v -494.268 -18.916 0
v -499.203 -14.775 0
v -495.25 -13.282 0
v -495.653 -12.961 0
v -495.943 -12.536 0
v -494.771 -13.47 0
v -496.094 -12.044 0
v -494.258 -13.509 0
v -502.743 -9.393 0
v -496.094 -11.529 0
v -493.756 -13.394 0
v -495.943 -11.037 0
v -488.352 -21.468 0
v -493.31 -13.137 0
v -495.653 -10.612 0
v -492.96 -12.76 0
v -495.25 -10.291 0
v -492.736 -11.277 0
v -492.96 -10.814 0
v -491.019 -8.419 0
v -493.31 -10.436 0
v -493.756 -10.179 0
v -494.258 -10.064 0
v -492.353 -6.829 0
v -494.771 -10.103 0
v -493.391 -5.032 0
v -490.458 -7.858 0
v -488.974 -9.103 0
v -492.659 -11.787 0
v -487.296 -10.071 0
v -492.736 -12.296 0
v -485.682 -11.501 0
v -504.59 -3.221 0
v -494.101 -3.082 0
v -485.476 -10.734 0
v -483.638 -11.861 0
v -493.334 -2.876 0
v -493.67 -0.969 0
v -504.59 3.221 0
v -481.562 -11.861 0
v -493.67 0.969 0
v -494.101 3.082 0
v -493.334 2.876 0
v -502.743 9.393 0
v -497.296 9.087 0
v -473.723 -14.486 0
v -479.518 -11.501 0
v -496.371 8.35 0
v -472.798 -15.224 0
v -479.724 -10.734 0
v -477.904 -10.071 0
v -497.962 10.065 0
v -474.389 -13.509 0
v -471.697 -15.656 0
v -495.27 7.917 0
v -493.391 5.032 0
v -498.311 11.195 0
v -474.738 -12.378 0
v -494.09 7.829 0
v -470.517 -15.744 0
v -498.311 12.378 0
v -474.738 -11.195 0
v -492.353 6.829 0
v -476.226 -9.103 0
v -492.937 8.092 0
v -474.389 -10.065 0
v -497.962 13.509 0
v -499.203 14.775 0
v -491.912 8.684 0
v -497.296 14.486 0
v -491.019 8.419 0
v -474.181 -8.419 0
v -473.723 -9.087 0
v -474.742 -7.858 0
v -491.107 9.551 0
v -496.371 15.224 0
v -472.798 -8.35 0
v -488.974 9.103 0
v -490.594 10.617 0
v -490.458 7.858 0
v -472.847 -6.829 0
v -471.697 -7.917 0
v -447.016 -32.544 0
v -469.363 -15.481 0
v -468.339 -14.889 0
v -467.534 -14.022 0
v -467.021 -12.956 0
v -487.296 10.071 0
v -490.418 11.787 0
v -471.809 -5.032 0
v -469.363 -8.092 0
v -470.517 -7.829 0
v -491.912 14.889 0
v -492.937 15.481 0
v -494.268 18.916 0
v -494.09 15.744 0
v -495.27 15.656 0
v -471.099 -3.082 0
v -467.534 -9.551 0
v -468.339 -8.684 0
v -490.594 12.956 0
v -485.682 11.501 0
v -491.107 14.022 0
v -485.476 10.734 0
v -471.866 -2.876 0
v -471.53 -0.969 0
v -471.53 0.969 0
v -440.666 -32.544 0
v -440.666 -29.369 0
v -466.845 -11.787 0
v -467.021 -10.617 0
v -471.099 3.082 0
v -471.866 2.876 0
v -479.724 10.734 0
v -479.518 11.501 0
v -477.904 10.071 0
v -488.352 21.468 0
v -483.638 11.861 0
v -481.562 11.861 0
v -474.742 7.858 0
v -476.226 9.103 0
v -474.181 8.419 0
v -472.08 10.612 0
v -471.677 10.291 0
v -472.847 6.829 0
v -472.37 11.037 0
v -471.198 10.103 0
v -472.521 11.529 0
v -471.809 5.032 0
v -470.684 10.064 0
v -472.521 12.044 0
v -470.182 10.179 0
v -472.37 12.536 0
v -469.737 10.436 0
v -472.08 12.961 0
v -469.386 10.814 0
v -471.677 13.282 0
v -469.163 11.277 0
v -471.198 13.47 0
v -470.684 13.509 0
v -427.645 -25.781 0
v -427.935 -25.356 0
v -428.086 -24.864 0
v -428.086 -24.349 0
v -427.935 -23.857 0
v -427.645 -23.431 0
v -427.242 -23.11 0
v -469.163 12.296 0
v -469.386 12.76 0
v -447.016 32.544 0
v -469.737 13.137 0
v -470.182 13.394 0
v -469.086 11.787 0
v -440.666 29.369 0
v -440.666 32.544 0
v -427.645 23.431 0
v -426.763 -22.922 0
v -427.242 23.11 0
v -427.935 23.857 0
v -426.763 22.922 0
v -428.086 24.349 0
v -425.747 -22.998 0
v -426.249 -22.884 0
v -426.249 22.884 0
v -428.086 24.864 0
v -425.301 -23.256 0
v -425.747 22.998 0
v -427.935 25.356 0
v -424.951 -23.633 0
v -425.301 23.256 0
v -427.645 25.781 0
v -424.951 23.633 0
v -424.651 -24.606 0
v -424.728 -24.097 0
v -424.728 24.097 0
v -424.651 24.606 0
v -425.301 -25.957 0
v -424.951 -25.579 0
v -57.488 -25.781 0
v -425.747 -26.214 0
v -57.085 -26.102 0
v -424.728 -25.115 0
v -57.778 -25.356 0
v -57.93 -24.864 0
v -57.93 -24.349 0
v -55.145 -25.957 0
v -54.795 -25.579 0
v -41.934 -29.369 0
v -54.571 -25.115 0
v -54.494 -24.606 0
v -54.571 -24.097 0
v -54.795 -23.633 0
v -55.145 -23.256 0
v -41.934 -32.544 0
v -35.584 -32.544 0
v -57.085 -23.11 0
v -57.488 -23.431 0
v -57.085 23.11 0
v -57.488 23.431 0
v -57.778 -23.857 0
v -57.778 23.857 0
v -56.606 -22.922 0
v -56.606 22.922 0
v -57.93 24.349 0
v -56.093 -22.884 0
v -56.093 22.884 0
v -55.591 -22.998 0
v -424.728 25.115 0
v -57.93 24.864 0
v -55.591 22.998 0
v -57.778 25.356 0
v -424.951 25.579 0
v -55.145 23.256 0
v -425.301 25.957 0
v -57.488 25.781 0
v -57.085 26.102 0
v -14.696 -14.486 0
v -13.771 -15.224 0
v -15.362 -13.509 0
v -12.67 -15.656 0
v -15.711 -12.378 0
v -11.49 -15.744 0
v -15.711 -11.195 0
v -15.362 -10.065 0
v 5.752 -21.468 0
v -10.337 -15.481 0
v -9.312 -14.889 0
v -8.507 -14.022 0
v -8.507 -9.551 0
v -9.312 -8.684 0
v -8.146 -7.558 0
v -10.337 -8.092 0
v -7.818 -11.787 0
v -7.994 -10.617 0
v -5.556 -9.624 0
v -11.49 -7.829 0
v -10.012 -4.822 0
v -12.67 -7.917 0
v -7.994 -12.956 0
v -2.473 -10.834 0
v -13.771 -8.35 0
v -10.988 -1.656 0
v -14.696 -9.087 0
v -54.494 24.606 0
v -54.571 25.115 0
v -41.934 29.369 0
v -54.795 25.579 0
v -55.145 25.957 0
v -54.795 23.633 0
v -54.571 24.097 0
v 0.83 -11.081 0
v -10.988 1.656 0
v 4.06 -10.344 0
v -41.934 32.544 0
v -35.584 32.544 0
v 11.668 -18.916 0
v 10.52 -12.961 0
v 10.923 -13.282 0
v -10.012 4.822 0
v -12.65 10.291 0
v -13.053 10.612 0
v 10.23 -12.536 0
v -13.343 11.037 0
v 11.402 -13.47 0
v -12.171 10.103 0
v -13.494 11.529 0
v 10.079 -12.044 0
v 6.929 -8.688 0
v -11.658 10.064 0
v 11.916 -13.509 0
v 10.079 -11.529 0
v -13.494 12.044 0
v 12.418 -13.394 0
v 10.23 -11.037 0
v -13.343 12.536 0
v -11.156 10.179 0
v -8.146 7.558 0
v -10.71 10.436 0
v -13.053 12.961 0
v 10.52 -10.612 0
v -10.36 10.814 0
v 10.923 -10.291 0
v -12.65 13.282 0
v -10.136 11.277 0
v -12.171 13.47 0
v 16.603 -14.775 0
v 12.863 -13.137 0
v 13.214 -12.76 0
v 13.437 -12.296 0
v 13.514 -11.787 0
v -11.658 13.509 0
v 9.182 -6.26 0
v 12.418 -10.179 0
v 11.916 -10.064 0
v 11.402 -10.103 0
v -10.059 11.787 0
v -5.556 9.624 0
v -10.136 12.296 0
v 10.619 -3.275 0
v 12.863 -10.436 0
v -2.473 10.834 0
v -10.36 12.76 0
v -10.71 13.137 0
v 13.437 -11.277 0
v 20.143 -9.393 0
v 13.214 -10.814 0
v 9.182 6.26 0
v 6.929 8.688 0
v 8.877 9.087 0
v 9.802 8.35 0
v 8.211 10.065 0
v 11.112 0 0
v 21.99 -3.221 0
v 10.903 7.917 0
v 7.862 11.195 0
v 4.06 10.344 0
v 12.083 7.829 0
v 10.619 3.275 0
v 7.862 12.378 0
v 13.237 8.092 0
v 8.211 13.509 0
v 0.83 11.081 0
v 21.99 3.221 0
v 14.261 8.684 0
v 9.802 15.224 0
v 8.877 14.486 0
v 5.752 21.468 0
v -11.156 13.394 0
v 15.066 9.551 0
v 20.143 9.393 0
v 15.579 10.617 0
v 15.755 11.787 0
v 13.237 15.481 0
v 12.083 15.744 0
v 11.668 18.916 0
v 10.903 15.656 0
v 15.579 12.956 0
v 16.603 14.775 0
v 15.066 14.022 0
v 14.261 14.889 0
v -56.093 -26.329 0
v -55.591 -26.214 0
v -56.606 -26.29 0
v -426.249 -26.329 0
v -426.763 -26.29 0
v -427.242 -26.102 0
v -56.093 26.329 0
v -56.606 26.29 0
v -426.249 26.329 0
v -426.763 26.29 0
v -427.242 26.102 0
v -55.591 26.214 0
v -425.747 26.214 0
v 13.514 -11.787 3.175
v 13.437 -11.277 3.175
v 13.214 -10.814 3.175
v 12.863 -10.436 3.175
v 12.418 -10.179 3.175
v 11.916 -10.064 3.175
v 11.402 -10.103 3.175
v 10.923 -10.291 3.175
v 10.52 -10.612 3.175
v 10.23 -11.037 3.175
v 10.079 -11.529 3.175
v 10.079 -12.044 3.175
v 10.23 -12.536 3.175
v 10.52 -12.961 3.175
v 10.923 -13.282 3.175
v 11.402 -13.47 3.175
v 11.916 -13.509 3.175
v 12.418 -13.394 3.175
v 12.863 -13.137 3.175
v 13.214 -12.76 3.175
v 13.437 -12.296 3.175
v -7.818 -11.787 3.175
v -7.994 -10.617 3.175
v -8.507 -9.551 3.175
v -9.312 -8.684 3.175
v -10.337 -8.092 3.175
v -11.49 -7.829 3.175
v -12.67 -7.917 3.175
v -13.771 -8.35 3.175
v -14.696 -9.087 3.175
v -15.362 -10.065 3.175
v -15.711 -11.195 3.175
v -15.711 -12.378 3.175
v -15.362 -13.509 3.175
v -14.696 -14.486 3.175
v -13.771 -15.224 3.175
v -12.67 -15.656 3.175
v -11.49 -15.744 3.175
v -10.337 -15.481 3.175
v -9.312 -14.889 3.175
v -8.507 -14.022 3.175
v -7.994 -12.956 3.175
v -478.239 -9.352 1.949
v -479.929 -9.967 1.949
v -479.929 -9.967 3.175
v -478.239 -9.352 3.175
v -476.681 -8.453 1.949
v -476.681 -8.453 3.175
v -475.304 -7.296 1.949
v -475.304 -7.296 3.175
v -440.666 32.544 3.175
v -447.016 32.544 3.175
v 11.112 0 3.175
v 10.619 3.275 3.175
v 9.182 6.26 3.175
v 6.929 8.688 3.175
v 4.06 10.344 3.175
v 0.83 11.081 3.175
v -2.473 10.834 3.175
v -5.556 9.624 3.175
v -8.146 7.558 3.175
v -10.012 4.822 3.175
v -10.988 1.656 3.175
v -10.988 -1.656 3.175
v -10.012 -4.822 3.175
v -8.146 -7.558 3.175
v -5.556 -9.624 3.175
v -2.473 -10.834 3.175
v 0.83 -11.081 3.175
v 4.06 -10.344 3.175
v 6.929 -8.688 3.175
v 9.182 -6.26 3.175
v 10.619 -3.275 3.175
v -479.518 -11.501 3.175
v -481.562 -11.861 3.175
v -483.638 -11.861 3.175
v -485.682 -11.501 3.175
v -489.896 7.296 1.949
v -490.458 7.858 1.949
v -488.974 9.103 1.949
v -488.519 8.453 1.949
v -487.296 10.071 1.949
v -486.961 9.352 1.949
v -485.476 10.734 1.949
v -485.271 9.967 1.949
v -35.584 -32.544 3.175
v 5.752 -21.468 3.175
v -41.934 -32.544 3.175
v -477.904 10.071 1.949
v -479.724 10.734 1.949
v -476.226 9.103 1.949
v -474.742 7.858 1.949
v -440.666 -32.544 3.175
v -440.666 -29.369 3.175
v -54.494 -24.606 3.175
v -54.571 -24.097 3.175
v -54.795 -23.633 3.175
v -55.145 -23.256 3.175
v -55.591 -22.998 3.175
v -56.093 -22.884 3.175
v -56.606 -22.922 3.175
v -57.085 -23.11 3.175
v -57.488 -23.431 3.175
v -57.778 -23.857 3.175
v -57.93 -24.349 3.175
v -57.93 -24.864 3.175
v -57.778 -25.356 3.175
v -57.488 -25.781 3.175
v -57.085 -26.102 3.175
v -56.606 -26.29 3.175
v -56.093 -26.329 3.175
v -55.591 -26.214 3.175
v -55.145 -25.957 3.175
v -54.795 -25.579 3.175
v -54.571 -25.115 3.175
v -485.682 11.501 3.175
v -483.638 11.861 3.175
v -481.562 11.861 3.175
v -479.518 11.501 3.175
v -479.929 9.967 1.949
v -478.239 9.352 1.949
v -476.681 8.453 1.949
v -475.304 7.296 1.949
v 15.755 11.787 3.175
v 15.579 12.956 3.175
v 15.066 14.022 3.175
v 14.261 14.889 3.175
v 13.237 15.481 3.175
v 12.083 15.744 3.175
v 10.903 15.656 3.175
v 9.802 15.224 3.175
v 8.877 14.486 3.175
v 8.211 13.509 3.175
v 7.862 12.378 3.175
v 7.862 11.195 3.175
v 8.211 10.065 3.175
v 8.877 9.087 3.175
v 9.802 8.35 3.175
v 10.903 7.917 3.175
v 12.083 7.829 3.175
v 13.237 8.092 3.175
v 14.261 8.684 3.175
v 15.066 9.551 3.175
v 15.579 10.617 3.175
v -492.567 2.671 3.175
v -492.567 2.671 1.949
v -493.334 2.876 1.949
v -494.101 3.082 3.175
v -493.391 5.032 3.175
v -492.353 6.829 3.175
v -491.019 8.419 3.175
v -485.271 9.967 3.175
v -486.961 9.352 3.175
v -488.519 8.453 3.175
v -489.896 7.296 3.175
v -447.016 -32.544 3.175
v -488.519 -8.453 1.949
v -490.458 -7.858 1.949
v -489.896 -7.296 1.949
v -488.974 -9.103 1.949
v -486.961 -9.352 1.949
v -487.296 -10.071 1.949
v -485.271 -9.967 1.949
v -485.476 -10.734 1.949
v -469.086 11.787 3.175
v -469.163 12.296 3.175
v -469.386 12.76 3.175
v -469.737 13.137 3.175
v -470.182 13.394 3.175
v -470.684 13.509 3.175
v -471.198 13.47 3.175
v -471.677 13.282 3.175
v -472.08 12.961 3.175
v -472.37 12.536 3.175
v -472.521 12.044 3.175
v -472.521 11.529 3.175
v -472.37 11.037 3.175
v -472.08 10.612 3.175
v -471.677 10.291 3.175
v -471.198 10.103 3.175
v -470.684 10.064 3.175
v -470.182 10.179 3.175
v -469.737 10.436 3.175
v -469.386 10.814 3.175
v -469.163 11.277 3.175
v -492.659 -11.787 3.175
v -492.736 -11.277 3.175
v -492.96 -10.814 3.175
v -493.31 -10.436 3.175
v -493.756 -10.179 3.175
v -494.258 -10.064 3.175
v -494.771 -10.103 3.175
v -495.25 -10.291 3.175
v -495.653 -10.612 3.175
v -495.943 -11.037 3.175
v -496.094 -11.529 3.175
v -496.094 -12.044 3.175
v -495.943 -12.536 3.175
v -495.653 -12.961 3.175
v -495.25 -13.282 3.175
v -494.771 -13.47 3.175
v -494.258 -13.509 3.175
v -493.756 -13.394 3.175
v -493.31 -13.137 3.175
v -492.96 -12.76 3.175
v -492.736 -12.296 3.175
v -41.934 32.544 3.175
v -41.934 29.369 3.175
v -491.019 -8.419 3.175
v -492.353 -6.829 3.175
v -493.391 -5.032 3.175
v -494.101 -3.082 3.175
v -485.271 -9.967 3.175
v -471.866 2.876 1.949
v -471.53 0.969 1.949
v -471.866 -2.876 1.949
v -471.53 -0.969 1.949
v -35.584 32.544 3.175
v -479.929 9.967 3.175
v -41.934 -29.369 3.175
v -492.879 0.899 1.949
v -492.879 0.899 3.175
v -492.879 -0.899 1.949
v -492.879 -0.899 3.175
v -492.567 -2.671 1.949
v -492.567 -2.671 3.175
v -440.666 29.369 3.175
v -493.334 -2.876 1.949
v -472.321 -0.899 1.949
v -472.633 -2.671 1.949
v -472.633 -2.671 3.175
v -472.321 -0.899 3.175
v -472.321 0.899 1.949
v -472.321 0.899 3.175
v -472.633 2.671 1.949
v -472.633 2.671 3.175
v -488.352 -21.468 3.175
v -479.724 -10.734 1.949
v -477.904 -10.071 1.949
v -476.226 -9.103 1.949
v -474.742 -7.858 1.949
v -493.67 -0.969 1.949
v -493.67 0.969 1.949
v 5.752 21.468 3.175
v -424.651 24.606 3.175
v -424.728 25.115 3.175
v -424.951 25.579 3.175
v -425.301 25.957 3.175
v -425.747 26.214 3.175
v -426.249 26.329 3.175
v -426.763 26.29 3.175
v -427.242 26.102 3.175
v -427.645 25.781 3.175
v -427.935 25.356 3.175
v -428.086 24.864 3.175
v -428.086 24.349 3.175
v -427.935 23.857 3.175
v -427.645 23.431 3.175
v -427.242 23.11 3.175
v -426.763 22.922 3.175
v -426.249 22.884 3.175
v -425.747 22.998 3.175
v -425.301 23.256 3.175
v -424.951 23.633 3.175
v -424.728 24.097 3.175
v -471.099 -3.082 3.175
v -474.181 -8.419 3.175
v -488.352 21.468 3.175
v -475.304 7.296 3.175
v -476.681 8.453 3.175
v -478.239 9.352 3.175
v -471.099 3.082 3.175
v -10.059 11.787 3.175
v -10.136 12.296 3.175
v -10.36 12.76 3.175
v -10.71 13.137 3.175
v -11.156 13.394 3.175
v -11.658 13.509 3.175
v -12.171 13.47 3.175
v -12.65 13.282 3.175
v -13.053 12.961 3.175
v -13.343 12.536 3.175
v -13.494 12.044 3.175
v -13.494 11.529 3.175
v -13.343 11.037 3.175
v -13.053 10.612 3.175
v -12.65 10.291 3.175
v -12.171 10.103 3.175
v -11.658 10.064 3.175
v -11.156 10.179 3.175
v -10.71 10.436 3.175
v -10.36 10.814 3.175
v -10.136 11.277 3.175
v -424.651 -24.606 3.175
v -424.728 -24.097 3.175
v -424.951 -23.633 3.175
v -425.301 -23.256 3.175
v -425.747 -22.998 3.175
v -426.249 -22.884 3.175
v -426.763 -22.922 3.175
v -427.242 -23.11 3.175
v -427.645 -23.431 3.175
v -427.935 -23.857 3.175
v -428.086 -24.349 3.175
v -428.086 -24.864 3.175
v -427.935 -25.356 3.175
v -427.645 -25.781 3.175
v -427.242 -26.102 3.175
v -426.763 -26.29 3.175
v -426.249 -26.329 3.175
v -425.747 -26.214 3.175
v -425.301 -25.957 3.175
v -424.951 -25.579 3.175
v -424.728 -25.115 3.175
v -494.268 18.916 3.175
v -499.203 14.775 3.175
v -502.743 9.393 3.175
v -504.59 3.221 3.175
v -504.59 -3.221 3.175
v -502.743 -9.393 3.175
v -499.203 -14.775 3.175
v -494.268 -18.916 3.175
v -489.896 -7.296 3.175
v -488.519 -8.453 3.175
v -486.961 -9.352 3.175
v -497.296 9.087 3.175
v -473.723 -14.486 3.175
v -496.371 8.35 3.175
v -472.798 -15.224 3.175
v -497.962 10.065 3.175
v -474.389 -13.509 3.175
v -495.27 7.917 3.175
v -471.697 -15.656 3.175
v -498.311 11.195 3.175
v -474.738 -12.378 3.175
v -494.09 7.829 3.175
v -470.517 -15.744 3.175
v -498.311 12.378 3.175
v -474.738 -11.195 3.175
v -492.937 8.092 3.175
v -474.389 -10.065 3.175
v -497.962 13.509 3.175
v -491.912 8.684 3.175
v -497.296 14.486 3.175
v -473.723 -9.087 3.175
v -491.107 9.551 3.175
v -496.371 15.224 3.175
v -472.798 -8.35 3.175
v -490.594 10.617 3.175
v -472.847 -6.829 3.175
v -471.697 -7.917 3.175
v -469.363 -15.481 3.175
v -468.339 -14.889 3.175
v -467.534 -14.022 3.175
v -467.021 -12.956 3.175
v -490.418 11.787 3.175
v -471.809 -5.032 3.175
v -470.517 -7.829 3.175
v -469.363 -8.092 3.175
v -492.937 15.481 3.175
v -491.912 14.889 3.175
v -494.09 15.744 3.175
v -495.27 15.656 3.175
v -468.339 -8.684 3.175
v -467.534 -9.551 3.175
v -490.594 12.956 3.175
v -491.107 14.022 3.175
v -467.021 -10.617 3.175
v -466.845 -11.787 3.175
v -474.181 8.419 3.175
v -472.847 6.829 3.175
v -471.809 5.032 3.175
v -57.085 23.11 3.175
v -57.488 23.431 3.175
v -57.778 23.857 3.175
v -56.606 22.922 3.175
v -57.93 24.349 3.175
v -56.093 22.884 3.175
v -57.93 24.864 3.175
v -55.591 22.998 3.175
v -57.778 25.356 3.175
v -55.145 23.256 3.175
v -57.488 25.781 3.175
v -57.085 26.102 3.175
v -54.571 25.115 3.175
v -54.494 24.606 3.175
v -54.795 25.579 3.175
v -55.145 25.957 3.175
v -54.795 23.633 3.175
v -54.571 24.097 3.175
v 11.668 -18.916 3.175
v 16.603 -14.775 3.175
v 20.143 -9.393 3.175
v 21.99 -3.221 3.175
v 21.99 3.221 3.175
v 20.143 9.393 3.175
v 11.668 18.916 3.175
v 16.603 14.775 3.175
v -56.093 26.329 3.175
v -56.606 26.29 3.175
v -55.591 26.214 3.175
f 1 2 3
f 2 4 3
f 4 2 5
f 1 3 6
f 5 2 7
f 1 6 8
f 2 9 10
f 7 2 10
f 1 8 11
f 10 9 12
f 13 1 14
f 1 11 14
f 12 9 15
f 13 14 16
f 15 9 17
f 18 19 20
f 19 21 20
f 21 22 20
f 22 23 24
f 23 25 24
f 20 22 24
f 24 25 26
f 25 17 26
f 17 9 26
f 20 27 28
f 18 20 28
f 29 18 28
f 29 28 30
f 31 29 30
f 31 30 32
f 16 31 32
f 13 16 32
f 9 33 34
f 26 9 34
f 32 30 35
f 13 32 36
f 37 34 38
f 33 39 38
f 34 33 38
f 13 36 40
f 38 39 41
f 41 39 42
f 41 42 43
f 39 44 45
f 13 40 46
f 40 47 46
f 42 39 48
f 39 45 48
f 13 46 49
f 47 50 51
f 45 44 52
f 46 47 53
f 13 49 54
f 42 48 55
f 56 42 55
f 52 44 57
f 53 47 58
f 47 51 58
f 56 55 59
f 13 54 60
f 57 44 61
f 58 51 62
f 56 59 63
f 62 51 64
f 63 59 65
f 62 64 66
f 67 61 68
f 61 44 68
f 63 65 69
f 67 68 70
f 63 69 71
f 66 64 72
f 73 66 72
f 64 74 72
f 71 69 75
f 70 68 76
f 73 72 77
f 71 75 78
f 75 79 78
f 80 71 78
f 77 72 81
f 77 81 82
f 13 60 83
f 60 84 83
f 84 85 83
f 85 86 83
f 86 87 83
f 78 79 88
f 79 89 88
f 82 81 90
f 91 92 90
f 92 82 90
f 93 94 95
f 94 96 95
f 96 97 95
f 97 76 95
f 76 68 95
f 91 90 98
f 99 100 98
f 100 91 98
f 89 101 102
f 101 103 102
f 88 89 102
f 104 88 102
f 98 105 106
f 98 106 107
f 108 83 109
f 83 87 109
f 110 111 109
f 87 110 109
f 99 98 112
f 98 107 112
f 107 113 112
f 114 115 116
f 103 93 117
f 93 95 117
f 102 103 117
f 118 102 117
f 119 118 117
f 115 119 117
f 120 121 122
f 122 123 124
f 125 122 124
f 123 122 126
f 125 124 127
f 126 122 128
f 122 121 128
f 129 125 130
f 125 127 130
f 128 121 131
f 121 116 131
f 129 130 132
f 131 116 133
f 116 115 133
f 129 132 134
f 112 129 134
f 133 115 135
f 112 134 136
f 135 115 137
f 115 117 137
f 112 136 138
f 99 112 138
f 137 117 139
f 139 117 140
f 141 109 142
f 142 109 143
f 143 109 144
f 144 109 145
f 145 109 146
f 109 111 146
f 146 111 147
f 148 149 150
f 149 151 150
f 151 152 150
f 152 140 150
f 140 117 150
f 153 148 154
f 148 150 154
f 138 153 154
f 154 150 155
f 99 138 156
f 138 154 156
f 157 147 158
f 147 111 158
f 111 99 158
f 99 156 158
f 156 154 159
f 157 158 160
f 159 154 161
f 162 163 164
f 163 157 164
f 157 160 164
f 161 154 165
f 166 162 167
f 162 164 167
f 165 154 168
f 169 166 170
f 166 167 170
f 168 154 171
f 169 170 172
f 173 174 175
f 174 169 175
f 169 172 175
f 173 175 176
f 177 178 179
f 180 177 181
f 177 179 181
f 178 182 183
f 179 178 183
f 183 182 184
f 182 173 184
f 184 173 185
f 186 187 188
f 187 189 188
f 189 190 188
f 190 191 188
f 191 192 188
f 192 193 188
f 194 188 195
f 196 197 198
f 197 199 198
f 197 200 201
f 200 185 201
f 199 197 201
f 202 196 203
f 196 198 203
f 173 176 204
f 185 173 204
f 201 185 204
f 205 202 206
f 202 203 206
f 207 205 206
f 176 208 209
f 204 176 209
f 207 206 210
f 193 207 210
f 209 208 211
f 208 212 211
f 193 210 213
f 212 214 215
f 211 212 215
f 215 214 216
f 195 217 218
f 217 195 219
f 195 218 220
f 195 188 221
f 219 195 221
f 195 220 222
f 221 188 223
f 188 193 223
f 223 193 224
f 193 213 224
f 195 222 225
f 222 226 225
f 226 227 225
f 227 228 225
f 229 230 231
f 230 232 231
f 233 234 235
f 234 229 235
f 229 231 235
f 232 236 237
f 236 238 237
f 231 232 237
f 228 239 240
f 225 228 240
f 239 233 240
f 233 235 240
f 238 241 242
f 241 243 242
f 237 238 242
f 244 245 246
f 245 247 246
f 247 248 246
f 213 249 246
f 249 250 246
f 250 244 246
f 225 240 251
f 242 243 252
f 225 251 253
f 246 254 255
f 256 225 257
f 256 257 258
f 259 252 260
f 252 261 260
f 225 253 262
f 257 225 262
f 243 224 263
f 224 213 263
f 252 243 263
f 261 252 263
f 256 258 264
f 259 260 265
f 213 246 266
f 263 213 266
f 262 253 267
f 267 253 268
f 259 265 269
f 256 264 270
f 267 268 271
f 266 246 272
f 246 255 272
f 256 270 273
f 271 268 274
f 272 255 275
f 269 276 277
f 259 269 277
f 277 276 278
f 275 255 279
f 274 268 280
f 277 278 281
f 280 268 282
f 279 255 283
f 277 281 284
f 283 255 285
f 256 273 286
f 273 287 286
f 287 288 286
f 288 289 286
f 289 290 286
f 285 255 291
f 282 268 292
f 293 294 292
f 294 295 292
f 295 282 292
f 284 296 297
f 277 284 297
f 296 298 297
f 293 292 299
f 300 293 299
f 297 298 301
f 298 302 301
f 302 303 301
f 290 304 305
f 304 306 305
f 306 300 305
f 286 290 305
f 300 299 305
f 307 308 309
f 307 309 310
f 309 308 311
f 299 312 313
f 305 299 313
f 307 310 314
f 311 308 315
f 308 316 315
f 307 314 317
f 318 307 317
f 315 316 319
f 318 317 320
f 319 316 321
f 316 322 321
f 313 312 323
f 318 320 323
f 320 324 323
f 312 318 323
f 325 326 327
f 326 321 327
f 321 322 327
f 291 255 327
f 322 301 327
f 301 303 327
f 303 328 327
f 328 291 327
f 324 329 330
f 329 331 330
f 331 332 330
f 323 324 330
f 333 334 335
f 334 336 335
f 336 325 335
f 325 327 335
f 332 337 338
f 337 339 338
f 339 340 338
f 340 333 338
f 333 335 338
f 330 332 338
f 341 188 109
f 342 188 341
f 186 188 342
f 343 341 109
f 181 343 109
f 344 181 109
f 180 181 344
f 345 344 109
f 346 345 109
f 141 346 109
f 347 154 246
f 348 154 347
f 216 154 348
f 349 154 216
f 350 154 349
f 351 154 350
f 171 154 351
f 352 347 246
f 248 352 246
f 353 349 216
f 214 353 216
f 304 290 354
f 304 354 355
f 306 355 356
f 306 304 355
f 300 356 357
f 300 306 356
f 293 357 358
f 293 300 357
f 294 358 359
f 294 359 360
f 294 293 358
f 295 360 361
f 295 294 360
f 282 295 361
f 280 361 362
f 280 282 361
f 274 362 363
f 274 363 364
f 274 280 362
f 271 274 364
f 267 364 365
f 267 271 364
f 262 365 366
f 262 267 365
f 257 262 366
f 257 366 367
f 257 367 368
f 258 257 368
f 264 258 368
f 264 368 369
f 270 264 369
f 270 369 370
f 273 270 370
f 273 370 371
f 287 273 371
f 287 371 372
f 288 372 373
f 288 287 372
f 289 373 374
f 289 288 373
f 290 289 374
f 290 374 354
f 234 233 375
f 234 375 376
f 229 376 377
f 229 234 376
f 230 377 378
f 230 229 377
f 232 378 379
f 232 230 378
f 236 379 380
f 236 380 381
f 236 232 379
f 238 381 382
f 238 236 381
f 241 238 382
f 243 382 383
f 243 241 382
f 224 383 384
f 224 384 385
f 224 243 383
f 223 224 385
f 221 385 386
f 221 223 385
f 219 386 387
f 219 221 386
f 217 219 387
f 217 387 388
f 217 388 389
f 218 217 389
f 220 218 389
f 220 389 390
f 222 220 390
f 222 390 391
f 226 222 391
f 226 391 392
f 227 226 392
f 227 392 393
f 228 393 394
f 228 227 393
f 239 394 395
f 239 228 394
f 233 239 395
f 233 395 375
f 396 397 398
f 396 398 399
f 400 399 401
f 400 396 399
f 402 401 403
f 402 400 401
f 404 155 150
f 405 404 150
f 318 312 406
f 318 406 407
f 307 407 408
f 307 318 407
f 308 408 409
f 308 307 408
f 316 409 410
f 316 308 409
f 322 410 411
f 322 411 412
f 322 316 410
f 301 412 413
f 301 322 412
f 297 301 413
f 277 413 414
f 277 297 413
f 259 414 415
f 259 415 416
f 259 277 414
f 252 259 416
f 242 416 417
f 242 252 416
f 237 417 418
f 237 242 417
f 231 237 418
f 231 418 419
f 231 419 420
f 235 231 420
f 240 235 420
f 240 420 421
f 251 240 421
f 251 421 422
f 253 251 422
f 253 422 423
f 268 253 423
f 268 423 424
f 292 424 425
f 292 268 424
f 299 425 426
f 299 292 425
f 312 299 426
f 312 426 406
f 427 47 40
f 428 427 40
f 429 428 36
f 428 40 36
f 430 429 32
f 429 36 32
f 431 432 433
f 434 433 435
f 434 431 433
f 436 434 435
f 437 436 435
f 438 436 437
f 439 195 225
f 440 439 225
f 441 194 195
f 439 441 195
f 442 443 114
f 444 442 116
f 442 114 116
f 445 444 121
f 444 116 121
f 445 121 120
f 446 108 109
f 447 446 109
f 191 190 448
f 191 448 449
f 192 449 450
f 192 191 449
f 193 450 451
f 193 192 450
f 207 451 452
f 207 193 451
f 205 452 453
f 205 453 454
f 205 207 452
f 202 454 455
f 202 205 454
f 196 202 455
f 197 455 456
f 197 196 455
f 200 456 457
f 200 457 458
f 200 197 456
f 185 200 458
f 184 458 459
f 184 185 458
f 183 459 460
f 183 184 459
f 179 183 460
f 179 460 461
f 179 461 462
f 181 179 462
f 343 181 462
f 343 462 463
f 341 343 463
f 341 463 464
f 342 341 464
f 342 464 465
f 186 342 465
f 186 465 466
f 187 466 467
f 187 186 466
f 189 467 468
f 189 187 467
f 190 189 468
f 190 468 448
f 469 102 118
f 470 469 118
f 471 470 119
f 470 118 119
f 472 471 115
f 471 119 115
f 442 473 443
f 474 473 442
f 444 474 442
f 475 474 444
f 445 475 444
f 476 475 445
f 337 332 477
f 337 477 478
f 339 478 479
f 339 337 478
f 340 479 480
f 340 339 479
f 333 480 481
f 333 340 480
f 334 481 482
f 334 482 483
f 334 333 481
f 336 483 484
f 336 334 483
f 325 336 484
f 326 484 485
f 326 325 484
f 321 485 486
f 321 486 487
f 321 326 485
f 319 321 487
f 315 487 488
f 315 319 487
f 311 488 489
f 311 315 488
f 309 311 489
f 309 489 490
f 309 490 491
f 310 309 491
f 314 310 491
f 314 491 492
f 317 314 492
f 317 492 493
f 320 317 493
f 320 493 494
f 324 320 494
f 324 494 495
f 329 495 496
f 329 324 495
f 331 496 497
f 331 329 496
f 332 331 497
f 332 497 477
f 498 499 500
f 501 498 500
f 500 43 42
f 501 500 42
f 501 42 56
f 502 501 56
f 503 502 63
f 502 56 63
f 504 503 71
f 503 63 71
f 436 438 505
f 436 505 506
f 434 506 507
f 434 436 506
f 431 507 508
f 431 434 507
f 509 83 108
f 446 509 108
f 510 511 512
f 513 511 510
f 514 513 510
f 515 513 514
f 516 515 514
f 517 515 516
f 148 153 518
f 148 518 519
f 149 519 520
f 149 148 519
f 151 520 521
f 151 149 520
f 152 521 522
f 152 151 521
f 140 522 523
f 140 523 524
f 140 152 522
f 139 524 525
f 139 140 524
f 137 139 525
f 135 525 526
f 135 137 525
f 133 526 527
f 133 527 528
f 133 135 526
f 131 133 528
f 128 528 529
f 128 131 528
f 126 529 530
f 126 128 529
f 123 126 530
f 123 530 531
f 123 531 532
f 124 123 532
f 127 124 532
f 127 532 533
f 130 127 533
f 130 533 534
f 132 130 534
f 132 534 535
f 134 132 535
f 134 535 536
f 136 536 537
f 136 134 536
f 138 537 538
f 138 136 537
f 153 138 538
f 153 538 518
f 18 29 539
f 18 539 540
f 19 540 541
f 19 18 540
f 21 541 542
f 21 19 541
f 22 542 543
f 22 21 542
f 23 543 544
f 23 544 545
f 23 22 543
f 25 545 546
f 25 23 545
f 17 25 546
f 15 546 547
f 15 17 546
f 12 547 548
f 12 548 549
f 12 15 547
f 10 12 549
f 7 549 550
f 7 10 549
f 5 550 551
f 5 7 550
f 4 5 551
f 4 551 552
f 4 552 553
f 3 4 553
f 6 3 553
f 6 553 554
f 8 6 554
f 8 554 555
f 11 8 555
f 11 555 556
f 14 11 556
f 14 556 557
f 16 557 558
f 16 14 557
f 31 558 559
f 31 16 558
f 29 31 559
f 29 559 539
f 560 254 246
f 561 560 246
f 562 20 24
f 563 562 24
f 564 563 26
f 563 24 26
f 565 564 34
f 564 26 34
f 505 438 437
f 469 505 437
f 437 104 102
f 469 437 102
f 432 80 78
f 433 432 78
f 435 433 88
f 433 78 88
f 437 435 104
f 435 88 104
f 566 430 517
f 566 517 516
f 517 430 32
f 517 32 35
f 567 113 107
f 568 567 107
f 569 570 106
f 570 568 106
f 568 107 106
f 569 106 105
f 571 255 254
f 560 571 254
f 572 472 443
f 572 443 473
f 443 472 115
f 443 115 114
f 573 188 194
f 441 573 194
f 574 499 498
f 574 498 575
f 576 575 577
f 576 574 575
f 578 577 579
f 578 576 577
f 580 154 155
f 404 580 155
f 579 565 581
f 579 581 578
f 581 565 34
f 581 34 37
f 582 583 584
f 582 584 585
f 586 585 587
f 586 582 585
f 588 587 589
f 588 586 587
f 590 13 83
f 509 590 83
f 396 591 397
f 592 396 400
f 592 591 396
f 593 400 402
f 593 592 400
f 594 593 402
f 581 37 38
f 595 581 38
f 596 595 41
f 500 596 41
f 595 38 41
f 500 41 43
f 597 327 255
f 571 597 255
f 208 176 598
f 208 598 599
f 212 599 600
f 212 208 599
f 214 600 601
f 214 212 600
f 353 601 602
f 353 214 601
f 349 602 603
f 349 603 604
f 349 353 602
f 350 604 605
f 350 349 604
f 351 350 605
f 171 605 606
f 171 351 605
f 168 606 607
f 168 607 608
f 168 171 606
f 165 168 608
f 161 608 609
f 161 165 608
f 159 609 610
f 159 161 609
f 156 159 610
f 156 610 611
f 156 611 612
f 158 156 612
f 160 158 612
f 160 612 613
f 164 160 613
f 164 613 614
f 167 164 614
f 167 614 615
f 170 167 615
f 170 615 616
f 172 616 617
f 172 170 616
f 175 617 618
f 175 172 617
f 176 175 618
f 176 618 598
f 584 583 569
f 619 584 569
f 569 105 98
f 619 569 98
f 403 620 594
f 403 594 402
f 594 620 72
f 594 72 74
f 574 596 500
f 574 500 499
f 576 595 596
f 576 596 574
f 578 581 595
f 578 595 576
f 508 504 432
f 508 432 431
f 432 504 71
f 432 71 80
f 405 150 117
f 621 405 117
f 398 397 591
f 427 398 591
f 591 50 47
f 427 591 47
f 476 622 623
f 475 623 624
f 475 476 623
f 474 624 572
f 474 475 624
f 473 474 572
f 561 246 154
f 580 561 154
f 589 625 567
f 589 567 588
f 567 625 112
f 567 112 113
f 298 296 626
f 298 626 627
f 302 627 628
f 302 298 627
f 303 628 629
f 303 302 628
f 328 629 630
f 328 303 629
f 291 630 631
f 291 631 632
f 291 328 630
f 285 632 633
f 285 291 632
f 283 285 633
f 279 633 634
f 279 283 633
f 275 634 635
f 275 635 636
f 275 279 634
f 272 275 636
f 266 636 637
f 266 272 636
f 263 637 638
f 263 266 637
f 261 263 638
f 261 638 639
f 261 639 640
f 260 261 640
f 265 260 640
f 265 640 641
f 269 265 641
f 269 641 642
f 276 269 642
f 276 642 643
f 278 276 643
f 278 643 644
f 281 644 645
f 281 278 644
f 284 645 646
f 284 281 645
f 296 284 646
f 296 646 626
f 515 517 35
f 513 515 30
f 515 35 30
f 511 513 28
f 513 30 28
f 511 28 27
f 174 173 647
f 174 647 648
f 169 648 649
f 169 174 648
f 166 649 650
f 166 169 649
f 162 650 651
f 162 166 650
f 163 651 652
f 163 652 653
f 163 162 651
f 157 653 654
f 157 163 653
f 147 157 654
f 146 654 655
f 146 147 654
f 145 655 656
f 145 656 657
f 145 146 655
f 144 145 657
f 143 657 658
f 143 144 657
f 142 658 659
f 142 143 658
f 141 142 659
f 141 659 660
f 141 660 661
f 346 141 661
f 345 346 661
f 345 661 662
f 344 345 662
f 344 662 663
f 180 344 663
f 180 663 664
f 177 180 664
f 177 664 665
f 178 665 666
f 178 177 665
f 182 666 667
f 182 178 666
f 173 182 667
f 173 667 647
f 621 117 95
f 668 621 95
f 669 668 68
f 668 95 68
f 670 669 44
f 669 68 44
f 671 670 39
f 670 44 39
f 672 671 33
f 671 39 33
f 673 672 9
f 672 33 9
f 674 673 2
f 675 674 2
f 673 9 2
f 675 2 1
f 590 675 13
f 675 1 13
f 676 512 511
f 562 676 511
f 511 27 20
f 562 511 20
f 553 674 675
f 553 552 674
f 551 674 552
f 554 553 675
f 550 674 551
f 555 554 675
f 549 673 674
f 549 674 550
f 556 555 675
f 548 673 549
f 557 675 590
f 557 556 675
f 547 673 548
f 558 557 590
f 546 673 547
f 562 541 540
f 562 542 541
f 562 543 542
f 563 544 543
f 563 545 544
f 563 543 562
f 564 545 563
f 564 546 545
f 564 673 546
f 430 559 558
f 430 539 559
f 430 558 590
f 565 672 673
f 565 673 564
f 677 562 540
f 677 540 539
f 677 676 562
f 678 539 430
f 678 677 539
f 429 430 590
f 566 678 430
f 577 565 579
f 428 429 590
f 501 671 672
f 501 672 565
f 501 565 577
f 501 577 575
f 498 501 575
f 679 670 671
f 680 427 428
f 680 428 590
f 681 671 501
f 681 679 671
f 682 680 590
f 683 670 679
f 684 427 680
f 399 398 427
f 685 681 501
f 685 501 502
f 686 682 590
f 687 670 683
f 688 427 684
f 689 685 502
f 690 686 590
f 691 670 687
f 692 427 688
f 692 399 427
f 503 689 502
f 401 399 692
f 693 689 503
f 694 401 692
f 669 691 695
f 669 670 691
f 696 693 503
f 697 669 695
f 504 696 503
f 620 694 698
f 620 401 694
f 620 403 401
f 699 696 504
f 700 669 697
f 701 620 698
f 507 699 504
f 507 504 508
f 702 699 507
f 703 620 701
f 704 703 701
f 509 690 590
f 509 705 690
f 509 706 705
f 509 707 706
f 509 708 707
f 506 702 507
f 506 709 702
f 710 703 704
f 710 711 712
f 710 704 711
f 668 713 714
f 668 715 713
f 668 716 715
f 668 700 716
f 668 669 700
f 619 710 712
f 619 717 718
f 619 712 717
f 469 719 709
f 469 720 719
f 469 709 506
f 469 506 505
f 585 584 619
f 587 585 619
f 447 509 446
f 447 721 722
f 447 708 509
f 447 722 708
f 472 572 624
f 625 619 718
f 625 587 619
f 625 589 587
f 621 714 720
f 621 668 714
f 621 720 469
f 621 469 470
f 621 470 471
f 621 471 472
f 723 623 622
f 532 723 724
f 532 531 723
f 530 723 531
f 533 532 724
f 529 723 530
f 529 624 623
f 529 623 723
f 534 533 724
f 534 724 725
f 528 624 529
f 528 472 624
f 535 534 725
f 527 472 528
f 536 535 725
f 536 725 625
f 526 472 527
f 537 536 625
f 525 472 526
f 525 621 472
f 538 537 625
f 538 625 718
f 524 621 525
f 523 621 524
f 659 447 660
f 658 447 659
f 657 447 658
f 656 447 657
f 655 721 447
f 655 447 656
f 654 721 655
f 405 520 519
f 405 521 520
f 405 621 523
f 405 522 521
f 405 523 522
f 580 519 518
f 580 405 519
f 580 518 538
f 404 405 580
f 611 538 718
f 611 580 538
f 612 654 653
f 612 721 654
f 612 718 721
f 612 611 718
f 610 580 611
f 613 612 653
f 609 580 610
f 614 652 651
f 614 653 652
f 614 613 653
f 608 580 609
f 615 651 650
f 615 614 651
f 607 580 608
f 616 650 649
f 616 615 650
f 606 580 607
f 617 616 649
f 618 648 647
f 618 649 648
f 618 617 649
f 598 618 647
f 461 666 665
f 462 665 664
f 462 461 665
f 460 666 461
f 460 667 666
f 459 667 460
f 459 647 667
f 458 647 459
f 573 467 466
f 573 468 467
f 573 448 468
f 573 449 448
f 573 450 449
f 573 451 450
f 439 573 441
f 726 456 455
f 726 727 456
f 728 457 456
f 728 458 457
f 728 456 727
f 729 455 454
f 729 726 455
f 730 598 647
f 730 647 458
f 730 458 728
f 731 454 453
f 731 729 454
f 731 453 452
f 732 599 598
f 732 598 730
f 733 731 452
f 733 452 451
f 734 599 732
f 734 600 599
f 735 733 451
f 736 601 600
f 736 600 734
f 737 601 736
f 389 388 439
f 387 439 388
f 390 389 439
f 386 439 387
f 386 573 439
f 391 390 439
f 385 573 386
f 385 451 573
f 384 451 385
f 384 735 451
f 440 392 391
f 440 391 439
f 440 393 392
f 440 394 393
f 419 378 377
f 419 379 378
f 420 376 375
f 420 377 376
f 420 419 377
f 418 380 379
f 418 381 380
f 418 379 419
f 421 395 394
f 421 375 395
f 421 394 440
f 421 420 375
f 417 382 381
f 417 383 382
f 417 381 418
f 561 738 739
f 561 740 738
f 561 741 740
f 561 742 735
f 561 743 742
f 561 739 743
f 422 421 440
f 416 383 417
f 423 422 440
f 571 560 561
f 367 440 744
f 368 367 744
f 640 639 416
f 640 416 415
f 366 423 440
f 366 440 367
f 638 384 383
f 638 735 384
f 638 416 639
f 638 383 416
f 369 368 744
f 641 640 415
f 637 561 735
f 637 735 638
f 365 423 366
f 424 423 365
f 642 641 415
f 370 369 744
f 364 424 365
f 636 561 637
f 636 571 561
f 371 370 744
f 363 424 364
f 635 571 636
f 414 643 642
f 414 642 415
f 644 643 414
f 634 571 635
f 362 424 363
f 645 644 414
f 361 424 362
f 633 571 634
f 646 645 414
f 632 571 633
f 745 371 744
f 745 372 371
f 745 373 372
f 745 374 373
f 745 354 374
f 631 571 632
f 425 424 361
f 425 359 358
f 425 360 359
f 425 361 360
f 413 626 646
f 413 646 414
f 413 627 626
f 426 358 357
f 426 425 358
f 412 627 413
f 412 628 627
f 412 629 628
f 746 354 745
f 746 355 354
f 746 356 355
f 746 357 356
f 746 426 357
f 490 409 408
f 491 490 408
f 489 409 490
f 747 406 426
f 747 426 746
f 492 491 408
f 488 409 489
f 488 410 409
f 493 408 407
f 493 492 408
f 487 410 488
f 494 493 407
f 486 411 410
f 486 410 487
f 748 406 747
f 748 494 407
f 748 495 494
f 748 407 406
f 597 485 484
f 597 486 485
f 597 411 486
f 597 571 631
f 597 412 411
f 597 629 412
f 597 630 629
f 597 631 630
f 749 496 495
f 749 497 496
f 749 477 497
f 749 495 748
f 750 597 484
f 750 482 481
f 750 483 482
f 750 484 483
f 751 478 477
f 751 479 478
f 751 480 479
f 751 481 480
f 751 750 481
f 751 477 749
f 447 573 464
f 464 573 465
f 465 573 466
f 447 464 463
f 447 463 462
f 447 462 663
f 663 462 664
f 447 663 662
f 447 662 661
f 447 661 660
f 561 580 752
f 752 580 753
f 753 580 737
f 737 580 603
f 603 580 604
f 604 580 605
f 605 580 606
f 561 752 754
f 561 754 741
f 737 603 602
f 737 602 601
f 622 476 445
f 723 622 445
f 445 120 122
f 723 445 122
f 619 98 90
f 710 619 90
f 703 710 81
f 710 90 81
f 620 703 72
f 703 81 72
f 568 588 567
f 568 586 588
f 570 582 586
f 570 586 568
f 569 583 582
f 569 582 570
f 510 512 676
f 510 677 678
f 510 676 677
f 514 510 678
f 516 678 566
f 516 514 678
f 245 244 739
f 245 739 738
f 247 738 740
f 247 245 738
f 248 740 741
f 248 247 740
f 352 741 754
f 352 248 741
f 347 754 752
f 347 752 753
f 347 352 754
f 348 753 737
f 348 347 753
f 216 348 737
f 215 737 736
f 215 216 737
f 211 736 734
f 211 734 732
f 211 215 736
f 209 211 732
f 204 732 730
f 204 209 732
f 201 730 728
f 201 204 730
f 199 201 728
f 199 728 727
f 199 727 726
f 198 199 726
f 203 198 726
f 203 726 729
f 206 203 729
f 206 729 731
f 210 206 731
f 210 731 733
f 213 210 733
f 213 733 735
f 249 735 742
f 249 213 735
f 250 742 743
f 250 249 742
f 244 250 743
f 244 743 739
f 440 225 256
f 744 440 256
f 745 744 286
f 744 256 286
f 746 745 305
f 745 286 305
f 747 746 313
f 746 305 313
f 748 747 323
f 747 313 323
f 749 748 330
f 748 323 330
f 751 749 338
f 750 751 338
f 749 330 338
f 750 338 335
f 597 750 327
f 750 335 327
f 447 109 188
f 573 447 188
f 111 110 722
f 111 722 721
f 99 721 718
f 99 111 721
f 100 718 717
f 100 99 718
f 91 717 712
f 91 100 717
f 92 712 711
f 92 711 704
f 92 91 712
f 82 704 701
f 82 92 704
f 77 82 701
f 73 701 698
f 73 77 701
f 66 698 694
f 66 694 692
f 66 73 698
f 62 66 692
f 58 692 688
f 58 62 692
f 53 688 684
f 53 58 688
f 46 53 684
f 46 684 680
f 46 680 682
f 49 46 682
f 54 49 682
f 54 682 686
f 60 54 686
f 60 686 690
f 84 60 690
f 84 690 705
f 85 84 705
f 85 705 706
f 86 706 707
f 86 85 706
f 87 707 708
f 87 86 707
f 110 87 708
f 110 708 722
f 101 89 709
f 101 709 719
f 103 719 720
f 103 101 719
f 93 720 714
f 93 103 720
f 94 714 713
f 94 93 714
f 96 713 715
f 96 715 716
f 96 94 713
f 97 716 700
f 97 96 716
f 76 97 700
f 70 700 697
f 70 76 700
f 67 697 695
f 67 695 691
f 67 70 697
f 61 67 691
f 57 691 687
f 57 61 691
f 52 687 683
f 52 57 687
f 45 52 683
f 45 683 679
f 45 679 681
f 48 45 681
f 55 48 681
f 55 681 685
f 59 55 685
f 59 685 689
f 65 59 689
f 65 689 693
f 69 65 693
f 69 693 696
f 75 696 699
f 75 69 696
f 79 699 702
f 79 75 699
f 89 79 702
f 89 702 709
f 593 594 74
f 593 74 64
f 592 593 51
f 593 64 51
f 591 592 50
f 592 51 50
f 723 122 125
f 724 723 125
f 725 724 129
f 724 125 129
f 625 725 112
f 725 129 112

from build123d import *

# Parameters (mm, degrees)
F0_R     = 1.7272
F0_R_2   = 3.96875
F0_R_3   = 10.31875
F0_R_4   = 11.1125
F1_DEPTH = 3.175
F3_DEPTH = 3.175
F4_COUNT = 6
F4_ANGLE = 300
F5_R     = 11.1125
F6_DEPTH = 1.94945


with BuildPart() as f1:
    # F0 (on Top) → F1 (new body)
    with BuildSketch(Plane.XY):
        with BuildLine():
            Line((-447.0158774883, 32.54375), (-488.3522532774, 21.4677014893))
            ThreePointArc((-488.3522532774, 21.4677014893), (-504.825, 0), (-488.3522532774, -21.4677014893))
            Line((-488.3522532774, -21.4677014893), (-447.0158774883, -32.54375))
            Line((-447.0158774883, -32.54375), (-440.6658774883, -32.54375))
            Line((-440.6658774883, -32.54375), (-440.6658774883, -29.36875))
            Line((-440.6658774883, -29.36875), (-41.9341225117, -29.36875))
            Line((-41.9341225117, -29.36875), (-41.9341225117, -32.54375))
            Line((-41.9341225117, -32.54375), (-35.5841225117, -32.54375))
            Line((-35.5841225117, -32.54375), (5.7522532774, -21.4677014893))
            ThreePointArc((5.7522532774, -21.4677014893), (22.225, 0), (5.7522532774, 21.4677014893))
            Line((5.7522532774, 21.4677014893), (-35.5841225117, 32.54375))
            Line((-35.5841225117, 32.54375), (-41.9341225117, 32.54375))
            Line((-41.9341225117, 32.54375), (-41.9341225117, 29.36875))
            Line((-41.9341225117, 29.36875), (-440.6658774883, 29.36875))
            Line((-440.6658774883, 29.36875), (-440.6658774883, 32.54375))
            Line((-440.6658774883, 32.54375), (-447.0158774883, 32.54375))
        make_face()
        with Locations((-426.3783774883, -24.60625)):
            Circle(F0_R, mode=Mode.SUBTRACT)
        with Locations((-494.3865861589, -11.7865861589)):
            Circle(F0_R, mode=Mode.SUBTRACT)
        with Locations((-470.8134138411, -11.7865861589)):
            Circle(F0_R_2, mode=Mode.SUBTRACT)
        with Locations((-56.2216225117, -24.60625)):
            Circle(F0_R, mode=Mode.SUBTRACT)
        with Locations((-11.7865861589, -11.7865861589)):
            Circle(F0_R_2, mode=Mode.SUBTRACT)
        with Locations((11.7865861589, -11.7865861589)):
            Circle(F0_R, mode=Mode.SUBTRACT)
        with Locations((-482.6, 0)):
            Circle(F0_R_3, mode=Mode.SUBTRACT)
        with Locations((-494.3865861589, 11.7865861589)):
            Circle(F0_R_2, mode=Mode.SUBTRACT)
        with Locations((-470.8134138411, 11.7865861589)):
            Circle(F0_R, mode=Mode.SUBTRACT)
        with Locations((-426.3783774883, 24.60625)):
            Circle(F0_R, mode=Mode.SUBTRACT)
        Circle(F0_R_4, mode=Mode.SUBTRACT)
        with Locations((-11.7865861589, 11.7865861589)):
            Circle(F0_R, mode=Mode.SUBTRACT)
        with Locations((11.7865861589, 11.7865861589)):
            Circle(F0_R_2, mode=Mode.SUBTRACT)
        with Locations((-56.2216225117, 24.60625)):
            Circle(F0_R, mode=Mode.SUBTRACT)
    extrude(amount=F1_DEPTH)

    # F2 (on face) → F3 (cut, through all)
    with BuildSketch(Plane(origin=(0, 0, 0), x_dir=(1, 0, 0), z_dir=(0, 0, -1))):
        with BuildLine():
            ThreePointArc((-489.8964580984, -7.2964580984), (-491.5362996353, -5.159375), (-492.56714712, -2.6706890217))
            Line((-492.56714712, -2.6706890217), (-494.1005543693, -3.0815642558))
            ThreePointArc((-494.1005543693, -3.0815642558), (-492.9111149638, -5.953125), (-491.0189901135, -8.4189901135))
            Line((-491.0189901135, -8.4189901135), (-489.8964580984, -7.2964580984))
        make_face()
    f3 = extrude(amount=-F3_DEPTH, mode=Mode.SUBTRACT)

    # F4: F3 ×6 about axis
    f4_axis = Axis((-482.6, 0, 0), (0, 0, -1))
    for i in range(1, F4_COUNT):
        add(f3.rotate(f4_axis, i * F4_ANGLE / (F4_COUNT - 1)), mode=Mode.SUBTRACT)

    # F5 (on face) → F6 (cut)
    with BuildSketch(Plane(origin=(0, 0, 0), x_dir=(1, 0, 0), z_dir=(0, 0, -1))):
        with Locations((-482.6, 0)):
            Circle(F5_R)
    extrude(amount=-F6_DEPTH, mode=Mode.SUBTRACT)


solid = f1.part
